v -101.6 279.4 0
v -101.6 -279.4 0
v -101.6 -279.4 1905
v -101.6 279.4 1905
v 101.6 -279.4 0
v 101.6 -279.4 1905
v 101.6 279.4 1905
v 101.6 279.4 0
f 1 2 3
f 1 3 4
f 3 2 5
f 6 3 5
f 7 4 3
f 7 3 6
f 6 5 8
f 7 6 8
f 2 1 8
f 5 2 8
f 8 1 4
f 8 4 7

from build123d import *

# Parameters (mm, degrees)
F0_W     = 203.2
F0_H     = 558.8
F1_DEPTH = 1905
F2_W     = 14.003879
F2_H     = 537.845016
F3_DEPTH = 1905


with BuildPart() as f1:
    # F0 (on Top) → F1 (new body)
    with BuildSketch(Plane.XY):
        Rectangle(F0_W, F0_H)
    extrude(amount=F1_DEPTH)


with BuildPart() as f3:
    # F2 (on face) → F3 (new body)
    with BuildSketch(Plane.XY.offset(1905)):
        with Locations((108.601939, 0)):
            Rectangle(F2_W, F2_H)
    extrude(amount=F3_DEPTH)


solid = f1.part
